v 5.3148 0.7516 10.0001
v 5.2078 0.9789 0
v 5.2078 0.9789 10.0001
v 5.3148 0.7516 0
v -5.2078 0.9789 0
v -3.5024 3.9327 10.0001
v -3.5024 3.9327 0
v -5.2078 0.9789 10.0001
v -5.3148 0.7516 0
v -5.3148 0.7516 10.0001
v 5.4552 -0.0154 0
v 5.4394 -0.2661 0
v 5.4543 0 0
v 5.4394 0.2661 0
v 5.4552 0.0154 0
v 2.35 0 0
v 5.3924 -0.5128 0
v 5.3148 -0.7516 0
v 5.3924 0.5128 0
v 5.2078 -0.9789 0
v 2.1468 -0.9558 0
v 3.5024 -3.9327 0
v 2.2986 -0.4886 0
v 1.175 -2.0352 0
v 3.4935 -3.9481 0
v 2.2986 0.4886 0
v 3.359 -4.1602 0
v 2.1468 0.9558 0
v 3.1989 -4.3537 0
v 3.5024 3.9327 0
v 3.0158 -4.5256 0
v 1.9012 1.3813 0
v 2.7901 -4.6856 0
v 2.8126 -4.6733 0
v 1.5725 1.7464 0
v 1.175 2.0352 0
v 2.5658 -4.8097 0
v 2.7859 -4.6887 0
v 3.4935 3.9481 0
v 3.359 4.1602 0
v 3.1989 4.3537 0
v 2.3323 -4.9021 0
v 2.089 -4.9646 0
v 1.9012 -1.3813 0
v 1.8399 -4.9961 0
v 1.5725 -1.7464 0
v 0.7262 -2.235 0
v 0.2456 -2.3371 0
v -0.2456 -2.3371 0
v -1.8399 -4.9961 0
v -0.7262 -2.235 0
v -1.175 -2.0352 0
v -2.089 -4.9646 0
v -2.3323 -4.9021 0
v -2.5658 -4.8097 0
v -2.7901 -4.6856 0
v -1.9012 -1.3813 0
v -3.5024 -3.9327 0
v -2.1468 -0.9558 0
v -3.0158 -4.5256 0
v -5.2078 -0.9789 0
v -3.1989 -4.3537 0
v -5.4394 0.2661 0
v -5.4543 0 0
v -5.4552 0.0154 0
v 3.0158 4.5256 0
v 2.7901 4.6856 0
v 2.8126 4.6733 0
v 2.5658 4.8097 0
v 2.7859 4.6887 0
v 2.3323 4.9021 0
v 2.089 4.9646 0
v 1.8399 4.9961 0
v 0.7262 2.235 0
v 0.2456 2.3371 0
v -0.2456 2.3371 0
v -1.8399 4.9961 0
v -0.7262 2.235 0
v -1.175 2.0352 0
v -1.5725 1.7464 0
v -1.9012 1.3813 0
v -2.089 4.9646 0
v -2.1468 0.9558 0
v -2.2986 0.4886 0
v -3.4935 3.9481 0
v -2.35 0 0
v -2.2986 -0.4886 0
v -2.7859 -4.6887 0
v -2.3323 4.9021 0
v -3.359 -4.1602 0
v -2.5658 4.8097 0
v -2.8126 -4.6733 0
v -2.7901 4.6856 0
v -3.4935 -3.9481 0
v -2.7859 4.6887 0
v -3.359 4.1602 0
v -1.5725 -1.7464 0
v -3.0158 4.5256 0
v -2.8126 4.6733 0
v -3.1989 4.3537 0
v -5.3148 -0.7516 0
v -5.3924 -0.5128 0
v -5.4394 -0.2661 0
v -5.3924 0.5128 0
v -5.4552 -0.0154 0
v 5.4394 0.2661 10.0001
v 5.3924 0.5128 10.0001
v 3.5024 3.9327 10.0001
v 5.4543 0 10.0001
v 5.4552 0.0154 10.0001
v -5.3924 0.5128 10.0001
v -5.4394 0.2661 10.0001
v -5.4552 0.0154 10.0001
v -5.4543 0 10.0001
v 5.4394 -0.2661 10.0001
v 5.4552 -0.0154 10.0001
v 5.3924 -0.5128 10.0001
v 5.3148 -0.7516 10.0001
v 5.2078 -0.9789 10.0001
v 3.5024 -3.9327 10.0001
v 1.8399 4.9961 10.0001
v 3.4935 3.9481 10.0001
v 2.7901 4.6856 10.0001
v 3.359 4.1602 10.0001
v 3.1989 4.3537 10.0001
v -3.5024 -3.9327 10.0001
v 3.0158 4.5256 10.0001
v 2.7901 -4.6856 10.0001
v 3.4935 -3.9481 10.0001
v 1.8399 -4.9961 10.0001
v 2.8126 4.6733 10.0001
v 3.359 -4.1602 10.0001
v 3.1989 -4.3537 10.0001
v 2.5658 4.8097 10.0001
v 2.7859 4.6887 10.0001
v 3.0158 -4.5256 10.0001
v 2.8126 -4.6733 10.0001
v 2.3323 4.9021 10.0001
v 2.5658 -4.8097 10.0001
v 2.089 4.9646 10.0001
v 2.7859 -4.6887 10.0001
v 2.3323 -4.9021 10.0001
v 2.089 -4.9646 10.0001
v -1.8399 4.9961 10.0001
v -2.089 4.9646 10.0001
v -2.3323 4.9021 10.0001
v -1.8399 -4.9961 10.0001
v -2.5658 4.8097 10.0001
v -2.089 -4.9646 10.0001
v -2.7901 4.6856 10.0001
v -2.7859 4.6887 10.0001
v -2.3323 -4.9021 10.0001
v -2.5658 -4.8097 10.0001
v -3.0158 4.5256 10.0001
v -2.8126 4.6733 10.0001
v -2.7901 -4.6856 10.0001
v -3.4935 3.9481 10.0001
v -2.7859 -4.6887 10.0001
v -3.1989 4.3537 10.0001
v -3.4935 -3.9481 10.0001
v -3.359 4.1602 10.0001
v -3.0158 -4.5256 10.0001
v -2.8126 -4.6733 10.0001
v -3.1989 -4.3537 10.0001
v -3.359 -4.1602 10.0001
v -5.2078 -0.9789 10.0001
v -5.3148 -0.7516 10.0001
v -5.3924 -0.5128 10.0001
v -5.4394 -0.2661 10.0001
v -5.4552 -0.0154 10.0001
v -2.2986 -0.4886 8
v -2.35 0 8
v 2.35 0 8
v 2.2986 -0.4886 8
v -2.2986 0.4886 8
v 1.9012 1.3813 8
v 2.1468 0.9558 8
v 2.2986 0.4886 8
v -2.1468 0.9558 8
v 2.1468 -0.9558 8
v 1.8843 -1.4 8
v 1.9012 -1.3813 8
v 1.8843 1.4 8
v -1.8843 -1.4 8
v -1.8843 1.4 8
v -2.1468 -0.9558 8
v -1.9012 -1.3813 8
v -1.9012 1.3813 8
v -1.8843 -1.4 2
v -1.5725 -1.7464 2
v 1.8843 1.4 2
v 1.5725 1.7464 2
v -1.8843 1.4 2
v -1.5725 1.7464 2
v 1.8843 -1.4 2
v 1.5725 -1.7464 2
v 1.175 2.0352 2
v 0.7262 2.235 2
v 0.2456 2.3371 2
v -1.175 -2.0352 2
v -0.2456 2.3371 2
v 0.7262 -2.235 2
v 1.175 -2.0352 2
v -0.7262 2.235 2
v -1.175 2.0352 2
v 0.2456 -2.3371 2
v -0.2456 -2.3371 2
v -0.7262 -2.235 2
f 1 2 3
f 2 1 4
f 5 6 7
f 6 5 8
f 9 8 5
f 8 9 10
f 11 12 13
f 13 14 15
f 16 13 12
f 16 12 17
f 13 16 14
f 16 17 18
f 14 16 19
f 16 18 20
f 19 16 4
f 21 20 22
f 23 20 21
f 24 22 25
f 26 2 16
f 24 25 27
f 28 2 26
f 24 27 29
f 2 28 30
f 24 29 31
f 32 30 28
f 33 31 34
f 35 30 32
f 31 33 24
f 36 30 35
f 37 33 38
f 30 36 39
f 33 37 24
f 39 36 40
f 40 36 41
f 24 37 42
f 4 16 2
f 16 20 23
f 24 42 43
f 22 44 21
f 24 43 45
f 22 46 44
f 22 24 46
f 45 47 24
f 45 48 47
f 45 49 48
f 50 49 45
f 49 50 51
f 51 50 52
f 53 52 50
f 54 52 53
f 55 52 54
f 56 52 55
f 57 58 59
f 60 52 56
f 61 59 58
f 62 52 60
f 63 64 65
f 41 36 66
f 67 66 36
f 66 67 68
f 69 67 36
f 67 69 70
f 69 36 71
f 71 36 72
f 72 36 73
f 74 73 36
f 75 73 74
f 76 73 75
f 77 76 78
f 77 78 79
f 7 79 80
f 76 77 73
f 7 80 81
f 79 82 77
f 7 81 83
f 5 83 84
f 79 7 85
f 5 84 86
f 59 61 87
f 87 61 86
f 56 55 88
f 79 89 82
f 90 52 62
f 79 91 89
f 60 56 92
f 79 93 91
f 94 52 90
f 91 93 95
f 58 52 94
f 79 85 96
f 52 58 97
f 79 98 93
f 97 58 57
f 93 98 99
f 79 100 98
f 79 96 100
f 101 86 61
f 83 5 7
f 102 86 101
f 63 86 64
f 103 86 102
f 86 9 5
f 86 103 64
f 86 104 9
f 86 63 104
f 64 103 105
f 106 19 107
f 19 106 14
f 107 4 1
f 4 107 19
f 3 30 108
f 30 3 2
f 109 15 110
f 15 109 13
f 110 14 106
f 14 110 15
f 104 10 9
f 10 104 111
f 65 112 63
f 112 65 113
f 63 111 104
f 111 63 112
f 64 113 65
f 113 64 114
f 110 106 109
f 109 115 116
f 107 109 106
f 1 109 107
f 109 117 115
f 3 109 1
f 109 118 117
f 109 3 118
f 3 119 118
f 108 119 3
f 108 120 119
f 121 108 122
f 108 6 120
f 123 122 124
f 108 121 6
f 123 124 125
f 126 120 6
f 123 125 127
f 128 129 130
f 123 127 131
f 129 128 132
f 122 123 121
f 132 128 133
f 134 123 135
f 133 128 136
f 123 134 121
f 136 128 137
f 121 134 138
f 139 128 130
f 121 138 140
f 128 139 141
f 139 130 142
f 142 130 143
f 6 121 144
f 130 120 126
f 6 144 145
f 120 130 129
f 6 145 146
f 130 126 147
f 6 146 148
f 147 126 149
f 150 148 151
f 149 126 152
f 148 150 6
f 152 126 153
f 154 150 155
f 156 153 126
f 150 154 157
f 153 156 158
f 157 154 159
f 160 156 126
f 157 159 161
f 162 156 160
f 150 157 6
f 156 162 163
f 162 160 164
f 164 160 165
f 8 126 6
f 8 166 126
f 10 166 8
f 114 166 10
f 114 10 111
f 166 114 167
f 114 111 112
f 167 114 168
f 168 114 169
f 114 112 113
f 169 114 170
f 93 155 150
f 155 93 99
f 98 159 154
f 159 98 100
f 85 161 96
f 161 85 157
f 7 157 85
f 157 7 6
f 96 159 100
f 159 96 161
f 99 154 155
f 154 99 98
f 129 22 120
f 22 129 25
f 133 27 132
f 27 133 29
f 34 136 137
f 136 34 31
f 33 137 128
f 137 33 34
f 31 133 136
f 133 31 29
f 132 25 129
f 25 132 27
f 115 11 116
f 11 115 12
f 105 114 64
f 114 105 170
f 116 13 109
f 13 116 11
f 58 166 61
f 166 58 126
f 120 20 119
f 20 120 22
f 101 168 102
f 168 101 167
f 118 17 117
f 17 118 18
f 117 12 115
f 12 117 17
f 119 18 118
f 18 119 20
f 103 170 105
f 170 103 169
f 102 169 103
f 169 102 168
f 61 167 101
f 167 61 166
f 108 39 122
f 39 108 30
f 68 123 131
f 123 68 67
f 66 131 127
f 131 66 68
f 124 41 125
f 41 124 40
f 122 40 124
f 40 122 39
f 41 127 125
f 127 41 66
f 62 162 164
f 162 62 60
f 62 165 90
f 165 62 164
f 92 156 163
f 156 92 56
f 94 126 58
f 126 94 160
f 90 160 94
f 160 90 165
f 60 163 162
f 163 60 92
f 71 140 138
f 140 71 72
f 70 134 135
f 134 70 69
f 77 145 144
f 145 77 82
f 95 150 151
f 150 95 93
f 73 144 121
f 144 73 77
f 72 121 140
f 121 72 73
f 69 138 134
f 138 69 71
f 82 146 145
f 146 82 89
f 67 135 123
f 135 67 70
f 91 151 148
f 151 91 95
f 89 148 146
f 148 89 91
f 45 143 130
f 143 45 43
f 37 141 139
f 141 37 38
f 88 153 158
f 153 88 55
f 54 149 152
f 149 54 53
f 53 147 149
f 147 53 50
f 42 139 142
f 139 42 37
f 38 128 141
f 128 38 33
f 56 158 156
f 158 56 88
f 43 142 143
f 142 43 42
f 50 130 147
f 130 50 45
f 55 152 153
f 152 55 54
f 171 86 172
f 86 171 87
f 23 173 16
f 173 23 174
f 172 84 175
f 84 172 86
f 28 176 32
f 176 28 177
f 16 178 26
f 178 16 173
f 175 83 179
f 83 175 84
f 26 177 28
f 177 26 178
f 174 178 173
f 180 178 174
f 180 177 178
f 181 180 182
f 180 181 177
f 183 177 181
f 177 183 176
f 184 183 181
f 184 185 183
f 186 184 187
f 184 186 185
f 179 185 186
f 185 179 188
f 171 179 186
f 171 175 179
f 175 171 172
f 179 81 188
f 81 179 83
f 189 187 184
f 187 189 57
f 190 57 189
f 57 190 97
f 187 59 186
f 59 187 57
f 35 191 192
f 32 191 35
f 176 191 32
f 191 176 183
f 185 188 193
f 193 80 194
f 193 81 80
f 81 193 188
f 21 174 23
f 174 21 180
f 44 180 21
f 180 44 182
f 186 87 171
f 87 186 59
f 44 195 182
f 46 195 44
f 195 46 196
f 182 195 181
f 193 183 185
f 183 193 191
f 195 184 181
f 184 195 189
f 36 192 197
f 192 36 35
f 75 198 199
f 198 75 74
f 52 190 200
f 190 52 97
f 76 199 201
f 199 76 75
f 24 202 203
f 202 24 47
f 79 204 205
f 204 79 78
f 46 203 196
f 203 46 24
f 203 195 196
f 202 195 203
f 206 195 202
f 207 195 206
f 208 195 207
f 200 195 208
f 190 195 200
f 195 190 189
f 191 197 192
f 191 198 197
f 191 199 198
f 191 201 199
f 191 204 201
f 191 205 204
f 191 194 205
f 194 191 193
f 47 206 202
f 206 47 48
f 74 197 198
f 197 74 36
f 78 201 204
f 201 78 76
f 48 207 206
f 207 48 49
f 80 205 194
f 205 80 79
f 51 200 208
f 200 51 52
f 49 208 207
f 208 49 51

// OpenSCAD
use <MCAD/shapes.scad>


height=10;
width=10;
highquality=50;
lowquality=10;

module hexknob(myheight,mywidth,rounded,showref,quality){

widthmodifier=0.6;
minimalheight=0.0001;
$fn=quality;

if(showref){
translate([mywidth*1.5,0,0])
hexagon(mywidth,myheight);

}

if(rounded)
{



//$fn=50;
minkowski()
{
hexagon(mywidth*widthmodifier,myheight);
cylinder(r=2,h=minimalheight);
}

}
else
{
hexagon(mywidth,myheight);

}


}


module knobinsert(){

basewidth=30;
baseheight=20;
insertheight=80;
insertwidth=20;
fudgefactor=17; //8,14,20,17
fudgefactor2=8; //8,10,8 



intersection(){

cylinder(r= (basewidth+fudgefactor)/2,h=insertheight);


translate([0,0,(insertheight/2)   ])
cube([basewidth*2, insertwidth+fudgefactor2, insertheight], center = true);


}

cylinder(r=(basewidth+fudgefactor)/2,h=baseheight);
}


module makeknob()
{
scalefactor = 0.10;

difference(){
	translate([0,0,(height/2)   ])
	hexknob(height,width,true,false,highquality);
	//hexknob(height,width,false,false,lowquality);
	   scale([scalefactor,scalefactor,scalefactor ]) 
			knobinsert();	
	}	


//knobinsert();
}


makeknob();
